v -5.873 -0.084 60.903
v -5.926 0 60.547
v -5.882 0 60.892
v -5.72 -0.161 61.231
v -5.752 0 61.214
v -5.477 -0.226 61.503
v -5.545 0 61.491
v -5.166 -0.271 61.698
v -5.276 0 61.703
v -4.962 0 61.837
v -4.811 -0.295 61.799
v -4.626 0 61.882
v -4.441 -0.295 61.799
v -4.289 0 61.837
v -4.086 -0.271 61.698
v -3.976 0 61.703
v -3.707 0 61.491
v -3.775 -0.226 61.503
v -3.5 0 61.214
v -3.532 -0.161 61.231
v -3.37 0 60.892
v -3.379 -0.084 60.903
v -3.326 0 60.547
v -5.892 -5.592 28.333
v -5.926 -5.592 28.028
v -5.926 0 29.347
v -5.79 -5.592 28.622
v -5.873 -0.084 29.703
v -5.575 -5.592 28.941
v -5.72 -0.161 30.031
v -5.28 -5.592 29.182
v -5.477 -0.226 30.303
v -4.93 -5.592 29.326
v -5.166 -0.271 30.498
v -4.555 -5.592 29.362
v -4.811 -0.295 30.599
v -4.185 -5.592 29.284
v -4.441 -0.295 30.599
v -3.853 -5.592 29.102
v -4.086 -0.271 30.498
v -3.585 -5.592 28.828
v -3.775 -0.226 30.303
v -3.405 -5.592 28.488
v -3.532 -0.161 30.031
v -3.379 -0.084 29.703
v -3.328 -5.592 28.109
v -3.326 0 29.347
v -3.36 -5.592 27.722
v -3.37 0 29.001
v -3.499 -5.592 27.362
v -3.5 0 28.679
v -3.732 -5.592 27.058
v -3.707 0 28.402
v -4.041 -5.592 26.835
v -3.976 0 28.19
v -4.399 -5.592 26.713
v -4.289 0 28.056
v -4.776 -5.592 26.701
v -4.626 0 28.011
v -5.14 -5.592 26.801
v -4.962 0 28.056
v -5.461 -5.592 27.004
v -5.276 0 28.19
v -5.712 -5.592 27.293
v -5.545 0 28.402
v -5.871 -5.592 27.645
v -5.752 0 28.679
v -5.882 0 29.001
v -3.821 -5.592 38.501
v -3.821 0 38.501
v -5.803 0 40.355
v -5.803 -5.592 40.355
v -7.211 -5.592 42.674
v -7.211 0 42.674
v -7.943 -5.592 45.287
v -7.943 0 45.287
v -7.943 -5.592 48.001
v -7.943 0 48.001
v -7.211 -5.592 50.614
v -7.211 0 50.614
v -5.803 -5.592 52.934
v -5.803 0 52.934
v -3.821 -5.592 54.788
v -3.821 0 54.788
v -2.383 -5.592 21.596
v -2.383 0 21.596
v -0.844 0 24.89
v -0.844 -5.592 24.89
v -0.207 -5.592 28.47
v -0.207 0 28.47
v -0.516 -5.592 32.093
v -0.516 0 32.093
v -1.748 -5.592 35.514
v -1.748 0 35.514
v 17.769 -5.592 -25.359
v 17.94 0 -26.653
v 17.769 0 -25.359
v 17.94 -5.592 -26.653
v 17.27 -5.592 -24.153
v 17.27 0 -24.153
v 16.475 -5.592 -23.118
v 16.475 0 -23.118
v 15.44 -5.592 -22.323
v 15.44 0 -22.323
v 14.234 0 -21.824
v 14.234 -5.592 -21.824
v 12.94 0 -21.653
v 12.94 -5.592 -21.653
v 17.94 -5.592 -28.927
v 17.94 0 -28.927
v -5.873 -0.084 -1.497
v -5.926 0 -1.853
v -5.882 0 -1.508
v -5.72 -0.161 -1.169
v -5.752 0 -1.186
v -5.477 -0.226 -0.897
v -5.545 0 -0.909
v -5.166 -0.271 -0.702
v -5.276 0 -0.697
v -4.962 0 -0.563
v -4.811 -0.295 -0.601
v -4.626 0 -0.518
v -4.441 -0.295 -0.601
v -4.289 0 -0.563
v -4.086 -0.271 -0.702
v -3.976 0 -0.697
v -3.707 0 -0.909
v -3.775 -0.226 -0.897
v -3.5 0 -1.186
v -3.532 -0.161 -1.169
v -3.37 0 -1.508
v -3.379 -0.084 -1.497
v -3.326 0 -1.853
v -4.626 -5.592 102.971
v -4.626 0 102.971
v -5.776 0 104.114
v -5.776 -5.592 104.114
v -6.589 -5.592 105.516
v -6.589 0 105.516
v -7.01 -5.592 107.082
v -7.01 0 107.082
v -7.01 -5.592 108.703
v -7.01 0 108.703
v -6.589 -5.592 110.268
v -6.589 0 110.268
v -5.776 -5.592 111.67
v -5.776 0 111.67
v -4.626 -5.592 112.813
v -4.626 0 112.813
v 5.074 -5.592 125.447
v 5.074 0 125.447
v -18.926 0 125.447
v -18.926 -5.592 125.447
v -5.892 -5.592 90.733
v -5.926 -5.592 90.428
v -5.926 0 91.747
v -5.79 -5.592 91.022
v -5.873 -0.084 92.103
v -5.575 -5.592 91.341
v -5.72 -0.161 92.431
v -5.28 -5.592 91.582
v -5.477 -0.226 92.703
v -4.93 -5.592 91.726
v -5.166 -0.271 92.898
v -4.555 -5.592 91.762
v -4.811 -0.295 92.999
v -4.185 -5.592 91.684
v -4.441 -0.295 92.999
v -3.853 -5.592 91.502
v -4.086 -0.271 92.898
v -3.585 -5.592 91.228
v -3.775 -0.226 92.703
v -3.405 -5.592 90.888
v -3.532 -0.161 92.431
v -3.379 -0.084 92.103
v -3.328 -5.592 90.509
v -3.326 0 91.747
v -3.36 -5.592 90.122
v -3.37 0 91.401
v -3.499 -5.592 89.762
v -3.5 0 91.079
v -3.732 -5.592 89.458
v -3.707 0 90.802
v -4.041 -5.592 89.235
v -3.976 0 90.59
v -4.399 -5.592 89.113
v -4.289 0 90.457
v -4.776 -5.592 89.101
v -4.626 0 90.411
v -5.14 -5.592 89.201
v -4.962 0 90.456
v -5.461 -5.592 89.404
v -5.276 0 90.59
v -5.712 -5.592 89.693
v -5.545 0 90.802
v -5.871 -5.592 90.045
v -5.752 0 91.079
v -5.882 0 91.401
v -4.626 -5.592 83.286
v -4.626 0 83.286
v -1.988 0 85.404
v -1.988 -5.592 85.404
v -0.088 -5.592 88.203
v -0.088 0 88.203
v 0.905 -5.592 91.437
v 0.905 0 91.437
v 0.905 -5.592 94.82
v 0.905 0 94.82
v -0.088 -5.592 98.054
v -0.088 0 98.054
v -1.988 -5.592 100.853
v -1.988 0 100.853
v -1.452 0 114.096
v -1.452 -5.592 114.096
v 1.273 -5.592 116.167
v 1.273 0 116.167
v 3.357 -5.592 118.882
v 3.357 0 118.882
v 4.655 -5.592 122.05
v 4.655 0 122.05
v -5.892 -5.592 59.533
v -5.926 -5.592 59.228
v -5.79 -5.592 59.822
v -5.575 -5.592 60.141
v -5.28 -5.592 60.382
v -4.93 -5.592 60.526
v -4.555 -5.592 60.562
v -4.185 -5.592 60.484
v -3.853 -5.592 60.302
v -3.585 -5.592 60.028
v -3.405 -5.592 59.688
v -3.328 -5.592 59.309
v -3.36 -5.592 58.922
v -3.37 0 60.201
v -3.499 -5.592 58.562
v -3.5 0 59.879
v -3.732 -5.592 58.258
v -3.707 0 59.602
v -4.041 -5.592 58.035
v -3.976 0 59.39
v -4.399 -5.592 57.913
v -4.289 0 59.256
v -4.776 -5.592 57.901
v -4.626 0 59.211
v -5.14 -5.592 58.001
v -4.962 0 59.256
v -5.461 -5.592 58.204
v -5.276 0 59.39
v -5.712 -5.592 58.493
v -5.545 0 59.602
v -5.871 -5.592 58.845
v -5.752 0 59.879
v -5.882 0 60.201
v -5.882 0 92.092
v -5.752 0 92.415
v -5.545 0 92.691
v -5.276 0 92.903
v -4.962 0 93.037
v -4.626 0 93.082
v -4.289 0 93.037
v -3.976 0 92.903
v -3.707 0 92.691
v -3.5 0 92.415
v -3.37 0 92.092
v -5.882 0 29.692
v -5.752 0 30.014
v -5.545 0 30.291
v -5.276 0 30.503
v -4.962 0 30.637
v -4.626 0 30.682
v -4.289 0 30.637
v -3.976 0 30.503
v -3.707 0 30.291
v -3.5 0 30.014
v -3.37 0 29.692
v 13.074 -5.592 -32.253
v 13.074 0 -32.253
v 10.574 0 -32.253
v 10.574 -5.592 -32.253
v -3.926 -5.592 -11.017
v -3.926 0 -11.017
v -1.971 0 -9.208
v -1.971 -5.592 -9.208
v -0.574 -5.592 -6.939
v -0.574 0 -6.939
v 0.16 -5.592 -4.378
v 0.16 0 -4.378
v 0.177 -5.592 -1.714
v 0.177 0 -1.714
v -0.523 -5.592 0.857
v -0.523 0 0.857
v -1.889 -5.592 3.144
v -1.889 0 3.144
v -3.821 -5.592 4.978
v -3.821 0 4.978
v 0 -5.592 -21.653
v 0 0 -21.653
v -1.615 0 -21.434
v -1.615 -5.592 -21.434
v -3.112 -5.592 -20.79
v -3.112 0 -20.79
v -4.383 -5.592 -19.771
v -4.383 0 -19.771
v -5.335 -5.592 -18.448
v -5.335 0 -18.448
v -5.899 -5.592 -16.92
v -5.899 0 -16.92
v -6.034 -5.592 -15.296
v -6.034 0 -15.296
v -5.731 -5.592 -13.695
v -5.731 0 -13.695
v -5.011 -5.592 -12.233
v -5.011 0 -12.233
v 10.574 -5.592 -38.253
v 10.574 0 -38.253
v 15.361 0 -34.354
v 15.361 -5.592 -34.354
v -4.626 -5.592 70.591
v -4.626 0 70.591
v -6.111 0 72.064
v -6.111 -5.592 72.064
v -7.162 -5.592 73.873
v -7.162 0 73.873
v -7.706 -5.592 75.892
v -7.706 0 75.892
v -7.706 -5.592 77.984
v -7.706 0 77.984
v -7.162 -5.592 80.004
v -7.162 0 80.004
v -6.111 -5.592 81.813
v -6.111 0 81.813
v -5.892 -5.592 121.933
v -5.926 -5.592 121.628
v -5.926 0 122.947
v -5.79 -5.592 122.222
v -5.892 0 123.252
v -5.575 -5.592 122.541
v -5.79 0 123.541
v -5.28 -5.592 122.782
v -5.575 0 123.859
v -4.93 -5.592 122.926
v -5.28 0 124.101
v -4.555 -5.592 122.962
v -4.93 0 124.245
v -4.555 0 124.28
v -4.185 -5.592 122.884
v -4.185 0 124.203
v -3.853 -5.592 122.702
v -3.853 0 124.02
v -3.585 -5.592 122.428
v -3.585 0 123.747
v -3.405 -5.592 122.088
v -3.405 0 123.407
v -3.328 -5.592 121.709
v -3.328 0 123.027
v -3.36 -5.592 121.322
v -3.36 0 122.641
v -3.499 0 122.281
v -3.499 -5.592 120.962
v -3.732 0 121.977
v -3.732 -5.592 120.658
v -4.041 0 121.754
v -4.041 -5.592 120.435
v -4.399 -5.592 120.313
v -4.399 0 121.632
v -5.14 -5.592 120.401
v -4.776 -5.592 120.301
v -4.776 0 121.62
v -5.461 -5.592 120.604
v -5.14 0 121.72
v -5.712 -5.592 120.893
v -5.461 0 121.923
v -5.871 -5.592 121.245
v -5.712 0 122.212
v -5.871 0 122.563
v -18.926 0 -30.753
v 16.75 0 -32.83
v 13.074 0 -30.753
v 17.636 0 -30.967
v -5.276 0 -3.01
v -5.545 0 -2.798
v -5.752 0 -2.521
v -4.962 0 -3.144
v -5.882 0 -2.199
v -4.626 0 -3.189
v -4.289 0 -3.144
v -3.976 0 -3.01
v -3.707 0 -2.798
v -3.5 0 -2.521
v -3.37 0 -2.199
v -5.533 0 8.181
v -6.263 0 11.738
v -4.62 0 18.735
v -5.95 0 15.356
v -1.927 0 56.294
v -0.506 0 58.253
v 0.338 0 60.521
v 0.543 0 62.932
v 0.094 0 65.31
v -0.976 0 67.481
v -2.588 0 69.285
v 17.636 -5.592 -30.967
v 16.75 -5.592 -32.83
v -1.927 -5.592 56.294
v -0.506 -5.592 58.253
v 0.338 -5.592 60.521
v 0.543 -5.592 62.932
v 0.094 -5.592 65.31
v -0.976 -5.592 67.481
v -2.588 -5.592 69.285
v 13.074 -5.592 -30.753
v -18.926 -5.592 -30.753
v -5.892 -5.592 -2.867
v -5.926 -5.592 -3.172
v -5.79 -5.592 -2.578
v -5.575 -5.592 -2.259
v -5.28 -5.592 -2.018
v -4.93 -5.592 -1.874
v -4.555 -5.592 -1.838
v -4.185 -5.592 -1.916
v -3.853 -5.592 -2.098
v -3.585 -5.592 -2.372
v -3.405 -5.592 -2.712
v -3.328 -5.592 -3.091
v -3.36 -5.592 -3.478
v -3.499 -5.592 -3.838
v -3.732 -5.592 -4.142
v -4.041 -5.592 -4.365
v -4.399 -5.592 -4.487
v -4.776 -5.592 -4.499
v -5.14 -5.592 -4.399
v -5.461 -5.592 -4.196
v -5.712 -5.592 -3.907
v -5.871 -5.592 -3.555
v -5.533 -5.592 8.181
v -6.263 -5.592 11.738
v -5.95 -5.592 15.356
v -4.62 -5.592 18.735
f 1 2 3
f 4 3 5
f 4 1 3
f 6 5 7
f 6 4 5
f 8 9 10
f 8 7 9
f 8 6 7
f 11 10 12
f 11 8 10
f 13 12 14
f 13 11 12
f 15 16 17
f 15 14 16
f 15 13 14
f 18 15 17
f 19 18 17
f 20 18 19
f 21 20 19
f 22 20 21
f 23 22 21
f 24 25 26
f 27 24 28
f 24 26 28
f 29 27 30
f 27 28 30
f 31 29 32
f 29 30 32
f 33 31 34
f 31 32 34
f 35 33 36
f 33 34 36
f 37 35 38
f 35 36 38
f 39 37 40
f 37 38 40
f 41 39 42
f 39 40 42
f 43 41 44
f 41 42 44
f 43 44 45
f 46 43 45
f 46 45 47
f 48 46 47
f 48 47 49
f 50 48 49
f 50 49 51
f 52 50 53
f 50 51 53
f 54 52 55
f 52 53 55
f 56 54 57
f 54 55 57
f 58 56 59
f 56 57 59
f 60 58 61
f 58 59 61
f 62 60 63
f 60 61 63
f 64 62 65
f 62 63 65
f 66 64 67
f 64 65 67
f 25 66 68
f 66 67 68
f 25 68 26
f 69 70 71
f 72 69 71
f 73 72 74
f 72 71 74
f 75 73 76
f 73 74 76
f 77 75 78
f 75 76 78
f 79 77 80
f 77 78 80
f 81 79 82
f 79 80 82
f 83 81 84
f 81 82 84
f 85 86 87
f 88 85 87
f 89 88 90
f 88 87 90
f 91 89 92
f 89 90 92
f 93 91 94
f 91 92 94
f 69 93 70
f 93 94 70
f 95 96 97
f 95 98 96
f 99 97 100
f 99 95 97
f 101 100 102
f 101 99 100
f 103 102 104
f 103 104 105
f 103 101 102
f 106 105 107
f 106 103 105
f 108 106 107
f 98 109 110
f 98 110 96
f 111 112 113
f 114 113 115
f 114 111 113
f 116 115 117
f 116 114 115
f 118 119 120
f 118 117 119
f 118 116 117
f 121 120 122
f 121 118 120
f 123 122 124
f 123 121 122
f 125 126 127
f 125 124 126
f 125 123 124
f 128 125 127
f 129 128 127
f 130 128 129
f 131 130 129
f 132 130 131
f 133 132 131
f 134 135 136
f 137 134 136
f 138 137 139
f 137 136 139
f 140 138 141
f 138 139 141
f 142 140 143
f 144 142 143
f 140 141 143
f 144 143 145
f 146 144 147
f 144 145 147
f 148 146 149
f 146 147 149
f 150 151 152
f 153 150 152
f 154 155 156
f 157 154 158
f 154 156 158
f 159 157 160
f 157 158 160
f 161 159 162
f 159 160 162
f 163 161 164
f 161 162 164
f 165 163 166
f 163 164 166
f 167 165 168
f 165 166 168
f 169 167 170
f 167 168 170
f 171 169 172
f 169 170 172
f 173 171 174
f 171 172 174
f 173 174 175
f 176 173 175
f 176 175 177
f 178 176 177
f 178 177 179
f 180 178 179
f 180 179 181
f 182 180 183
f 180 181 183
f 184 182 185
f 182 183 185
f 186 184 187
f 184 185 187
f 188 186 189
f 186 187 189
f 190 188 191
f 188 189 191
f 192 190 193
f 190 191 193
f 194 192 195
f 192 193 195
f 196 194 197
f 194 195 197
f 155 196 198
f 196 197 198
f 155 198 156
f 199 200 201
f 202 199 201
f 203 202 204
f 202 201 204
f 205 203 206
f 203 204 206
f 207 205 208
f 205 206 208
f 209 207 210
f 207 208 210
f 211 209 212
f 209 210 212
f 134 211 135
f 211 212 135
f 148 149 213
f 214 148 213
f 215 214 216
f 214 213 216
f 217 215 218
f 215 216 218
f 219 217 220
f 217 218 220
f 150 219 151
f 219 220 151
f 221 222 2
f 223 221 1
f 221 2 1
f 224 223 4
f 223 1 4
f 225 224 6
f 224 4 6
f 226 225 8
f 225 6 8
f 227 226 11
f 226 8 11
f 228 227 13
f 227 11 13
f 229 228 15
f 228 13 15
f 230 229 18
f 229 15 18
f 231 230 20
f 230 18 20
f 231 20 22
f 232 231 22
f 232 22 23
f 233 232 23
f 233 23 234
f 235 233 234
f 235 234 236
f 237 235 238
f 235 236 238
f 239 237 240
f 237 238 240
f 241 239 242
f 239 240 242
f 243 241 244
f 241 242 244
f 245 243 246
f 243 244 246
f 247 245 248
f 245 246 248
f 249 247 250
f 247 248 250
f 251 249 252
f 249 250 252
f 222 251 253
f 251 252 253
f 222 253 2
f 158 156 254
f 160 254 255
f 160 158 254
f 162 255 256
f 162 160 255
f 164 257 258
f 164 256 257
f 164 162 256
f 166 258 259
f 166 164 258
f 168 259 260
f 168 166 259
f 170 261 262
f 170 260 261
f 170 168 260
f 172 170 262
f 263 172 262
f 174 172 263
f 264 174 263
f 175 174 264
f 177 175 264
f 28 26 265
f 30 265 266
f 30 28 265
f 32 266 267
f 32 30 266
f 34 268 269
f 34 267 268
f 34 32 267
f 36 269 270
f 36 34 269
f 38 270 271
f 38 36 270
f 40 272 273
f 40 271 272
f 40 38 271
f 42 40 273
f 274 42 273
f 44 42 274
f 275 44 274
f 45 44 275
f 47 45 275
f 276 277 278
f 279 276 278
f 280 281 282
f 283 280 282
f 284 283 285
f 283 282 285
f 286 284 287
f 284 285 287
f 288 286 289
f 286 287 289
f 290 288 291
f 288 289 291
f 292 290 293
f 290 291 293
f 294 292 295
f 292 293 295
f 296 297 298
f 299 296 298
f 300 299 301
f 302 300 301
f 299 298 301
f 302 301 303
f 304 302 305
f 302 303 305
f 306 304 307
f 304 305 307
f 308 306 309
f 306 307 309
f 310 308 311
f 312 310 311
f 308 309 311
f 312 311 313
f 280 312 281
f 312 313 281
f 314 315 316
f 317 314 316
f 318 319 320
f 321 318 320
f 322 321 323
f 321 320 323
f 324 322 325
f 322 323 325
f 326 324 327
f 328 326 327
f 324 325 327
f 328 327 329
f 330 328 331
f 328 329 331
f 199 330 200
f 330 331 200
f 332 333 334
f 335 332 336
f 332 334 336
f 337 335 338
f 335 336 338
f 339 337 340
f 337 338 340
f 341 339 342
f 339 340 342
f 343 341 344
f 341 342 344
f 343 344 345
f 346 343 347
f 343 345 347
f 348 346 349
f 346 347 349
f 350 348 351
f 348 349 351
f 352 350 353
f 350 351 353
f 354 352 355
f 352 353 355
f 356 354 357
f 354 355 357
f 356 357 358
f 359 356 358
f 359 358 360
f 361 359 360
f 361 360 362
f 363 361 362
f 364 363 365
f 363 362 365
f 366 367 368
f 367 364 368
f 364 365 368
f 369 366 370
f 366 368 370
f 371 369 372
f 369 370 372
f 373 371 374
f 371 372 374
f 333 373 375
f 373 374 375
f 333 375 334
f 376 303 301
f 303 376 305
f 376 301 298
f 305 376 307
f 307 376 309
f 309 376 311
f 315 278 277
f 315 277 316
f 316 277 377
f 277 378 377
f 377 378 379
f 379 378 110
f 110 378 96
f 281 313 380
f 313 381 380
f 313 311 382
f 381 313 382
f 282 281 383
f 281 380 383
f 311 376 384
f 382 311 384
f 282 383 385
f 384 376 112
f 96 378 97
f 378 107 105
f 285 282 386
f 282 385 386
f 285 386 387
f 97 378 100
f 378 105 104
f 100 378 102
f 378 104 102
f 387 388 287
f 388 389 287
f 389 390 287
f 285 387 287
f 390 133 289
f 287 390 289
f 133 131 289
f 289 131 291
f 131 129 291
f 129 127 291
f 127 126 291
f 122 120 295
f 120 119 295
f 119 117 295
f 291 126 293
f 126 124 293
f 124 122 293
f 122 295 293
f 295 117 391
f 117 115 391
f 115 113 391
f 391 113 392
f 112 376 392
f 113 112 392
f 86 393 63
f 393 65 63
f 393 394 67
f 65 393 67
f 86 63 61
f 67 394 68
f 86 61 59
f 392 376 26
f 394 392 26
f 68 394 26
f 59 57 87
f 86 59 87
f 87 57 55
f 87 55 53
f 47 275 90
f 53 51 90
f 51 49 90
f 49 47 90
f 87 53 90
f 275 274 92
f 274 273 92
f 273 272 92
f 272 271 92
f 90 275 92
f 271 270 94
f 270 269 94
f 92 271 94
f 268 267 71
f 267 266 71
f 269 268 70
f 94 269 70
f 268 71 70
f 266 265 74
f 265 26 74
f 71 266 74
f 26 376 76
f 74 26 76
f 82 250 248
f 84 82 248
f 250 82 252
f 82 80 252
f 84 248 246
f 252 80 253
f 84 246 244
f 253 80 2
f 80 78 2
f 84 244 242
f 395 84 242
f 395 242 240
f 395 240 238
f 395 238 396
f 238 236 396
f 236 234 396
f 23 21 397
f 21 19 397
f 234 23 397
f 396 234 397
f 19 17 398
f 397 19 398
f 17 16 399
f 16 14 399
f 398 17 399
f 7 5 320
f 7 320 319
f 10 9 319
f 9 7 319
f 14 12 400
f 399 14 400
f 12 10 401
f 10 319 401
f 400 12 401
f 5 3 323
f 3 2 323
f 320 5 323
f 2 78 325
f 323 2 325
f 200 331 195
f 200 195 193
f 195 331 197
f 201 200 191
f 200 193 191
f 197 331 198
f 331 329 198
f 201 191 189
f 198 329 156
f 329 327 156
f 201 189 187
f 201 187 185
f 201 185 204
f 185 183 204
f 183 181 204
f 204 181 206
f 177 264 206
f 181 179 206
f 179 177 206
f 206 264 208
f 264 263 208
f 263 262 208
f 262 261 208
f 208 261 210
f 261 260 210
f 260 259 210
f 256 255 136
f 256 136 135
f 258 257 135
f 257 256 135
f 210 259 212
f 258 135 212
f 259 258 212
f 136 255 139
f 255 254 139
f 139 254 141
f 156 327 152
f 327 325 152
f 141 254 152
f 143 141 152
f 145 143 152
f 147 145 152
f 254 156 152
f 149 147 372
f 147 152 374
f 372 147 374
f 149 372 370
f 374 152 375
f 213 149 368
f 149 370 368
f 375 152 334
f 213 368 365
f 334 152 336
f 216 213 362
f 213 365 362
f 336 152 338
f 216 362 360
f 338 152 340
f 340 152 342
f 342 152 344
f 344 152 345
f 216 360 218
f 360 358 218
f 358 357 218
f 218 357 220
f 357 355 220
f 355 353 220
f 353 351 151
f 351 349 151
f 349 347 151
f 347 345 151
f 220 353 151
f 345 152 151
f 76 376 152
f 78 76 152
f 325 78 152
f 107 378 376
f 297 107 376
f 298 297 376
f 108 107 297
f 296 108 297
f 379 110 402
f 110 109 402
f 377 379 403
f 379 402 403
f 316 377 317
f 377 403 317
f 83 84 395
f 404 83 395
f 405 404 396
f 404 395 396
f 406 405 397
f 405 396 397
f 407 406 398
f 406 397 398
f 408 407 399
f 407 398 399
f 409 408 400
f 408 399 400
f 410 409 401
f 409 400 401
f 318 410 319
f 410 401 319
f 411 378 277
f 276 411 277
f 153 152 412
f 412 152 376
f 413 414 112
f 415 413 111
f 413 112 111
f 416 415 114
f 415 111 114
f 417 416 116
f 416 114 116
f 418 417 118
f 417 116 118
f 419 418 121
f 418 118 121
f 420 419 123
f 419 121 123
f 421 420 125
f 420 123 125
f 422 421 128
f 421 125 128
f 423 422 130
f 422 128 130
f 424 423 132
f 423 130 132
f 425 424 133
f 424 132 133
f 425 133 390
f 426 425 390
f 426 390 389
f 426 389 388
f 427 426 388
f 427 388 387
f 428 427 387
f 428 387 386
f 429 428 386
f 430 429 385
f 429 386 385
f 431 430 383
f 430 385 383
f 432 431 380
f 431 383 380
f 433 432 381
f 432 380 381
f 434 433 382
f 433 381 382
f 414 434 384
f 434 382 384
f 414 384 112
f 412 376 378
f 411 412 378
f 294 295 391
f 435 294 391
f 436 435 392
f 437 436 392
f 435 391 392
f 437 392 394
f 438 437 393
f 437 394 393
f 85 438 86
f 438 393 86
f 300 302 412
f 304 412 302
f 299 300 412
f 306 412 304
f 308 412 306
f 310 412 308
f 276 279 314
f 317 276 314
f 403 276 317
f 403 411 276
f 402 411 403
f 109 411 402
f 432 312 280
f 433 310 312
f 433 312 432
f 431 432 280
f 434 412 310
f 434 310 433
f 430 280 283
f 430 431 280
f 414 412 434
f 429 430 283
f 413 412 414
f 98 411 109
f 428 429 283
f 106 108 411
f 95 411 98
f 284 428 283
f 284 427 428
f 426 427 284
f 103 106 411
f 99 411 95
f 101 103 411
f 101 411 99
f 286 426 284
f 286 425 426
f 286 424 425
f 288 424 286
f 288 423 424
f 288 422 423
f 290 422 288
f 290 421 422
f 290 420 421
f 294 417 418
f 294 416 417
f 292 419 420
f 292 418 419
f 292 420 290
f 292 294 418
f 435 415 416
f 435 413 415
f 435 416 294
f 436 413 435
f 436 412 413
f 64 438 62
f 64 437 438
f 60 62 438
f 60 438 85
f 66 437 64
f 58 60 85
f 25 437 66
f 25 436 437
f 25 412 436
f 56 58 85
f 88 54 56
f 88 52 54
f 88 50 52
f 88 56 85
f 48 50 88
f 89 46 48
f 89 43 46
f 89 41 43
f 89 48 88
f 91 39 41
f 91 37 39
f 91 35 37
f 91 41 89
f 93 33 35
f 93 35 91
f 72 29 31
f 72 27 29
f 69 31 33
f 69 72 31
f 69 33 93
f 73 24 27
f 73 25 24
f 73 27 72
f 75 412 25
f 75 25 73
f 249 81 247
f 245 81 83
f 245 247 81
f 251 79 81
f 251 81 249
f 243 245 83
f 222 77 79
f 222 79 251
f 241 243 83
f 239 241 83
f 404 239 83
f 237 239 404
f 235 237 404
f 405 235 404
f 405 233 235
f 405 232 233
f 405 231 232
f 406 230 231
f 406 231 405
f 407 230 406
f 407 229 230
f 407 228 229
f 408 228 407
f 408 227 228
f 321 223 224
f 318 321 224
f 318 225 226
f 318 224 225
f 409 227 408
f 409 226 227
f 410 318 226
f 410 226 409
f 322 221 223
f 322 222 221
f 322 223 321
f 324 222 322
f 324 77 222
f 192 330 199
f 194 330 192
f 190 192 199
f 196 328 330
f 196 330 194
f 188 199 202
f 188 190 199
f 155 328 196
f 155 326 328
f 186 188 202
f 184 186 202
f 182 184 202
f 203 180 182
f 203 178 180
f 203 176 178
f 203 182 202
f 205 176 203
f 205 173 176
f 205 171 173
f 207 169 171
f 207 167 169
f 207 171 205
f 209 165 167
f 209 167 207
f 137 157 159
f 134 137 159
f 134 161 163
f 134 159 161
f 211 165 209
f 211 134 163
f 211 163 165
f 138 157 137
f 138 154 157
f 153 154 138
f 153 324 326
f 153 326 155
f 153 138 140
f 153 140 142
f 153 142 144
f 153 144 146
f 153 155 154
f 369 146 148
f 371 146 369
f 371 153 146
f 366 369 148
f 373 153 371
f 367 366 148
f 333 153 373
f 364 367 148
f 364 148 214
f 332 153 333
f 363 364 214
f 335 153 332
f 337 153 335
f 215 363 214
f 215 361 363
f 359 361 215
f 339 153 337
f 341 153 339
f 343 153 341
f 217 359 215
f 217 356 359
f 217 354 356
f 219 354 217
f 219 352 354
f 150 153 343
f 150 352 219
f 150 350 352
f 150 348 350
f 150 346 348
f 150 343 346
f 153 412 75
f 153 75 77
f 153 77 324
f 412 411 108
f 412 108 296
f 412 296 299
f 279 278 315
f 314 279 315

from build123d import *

# Parameters (mm, degrees)
F11_DEPTH = 5.59188
F4_R      = 1.3
F5_R      = 1.3
F9_R      = 1.3
F6_R      = 1.3
F10_R     = 1.3
F12_DEPTH = 12.5
F13_R     = 5
F14_R     = 7


with BuildPart() as f11:
    # F0 (on Front) → F11 (new body)
    with BuildSketch(Plane.XZ):
        with BuildLine():
            Line((5.074043, 125.446646), (-18.925957, 125.446646))
            Line((-18.925957, 125.446646), (-18.925957, -30.753354))
            Line((-18.925957, -30.753354), (13.074043, -30.753354))
            Line((13.074043, -30.753354), (13.074043, -32.253354))
            Line((13.074043, -32.253354), (10.574043, -32.253354))
            Line((10.574043, -32.253354), (10.574043, -38.253354))
            Line((10.574043, -38.253354), (17.939503, -32.253354))
            Line((17.939503, -32.253354), (17.939503, -21.653354))
            Line((17.939503, -21.653354), (0, -21.653354))
            ThreePointArc((0, -21.653354), (-5.66883, -17.703115), (-3.925964, -11.017126))
            ThreePointArc((-3.925964, -11.017126), (0.25929, -3.046463), (-3.820934, 4.978473))
            ThreePointArc((-3.820934, 4.978473), (-6.236981, 13.558536), (-2.382879, 21.59599))
            ThreePointArc((-2.382879, 21.59599), (-0.24316, 30.291685), (-3.820934, 38.501012))
            ThreePointArc((-3.820934, 38.501012), (-8.035456, 46.644288), (-3.820934, 54.787565))
            ThreePointArc((-3.820934, 54.787565), (0.543337, 62.931922), (-4.625957, 70.590631))
            ThreePointArc((-4.625957, 70.590631), (-7.774459, 76.938306), (-4.625957, 83.285981))
            ThreePointArc((-4.625957, 83.285981), (1.031725, 93.12844), (-4.625957, 102.970899))
            ThreePointArc((-4.625957, 102.970899), (-7.063194, 107.892131), (-4.625957, 112.813362))
            ThreePointArc((-4.625957, 112.813362), (2.40535, 117.455168), (5.074043, 125.446646))
        make_face()
    extrude(amount=F11_DEPTH)

    # F4 (on face) + F5 (on face) + F9 (on face) + F6 (on face) + F10 (on face) → F12 (cut, symmetric)
    with BuildSketch(Plane(origin=(0, -0.41406, -0.097651), x_dir=(-1, 0, 0), z_dir=(0, 0.973299, 0.22954))):
        with Locations((4.625957, -1.803868)):
            Circle(F4_R)
    with BuildSketch(Plane(origin=(0, 6.556371, 1.546236), x_dir=(-1, 0, 0), z_dir=(0, 0.973299, 0.22954))):
        with Locations((4.625957, 28.563067)):
            Circle(F5_R)
    with BuildSketch(Plane(origin=(0, 20.497232, 4.83401), x_dir=(-1, 0, 0), z_dir=(0, 0.973299, 0.22954))):
        with Locations((4.625957, 89.296936)):
            Circle(F9_R)
    with BuildSketch(Plane(origin=(0, 13.526801, 3.190123), x_dir=(-1, 0, 0), z_dir=(0, 0.973299, 0.22954))):
        with Locations((4.625957, 58.930002)):
            Circle(F6_R)
    with BuildSketch(Plane(origin=(0, 27.467663, 6.477897), x_dir=(-1, 0, 0), z_dir=(0, 0.973299, 0.22954))):
        with Locations((4.625957, 119.663871)):
            Circle(F10_R)
    extrude(amount=F12_DEPTH, both=True, mode=Mode.SUBTRACT)

    # F13
    f13_edges = [f11.edges().sort_by_distance(p)[0] for p in [
        (17.939503, -2.79594, -21.653354),
    ]]
    fillet(f13_edges, radius=F13_R)

    # F14
    f14_edges = [f11.edges().sort_by_distance(p)[0] for p in [
        (17.939503, -2.79594, -32.253354),
    ]]
    fillet(f14_edges, radius=F14_R)


solid = f11.part
